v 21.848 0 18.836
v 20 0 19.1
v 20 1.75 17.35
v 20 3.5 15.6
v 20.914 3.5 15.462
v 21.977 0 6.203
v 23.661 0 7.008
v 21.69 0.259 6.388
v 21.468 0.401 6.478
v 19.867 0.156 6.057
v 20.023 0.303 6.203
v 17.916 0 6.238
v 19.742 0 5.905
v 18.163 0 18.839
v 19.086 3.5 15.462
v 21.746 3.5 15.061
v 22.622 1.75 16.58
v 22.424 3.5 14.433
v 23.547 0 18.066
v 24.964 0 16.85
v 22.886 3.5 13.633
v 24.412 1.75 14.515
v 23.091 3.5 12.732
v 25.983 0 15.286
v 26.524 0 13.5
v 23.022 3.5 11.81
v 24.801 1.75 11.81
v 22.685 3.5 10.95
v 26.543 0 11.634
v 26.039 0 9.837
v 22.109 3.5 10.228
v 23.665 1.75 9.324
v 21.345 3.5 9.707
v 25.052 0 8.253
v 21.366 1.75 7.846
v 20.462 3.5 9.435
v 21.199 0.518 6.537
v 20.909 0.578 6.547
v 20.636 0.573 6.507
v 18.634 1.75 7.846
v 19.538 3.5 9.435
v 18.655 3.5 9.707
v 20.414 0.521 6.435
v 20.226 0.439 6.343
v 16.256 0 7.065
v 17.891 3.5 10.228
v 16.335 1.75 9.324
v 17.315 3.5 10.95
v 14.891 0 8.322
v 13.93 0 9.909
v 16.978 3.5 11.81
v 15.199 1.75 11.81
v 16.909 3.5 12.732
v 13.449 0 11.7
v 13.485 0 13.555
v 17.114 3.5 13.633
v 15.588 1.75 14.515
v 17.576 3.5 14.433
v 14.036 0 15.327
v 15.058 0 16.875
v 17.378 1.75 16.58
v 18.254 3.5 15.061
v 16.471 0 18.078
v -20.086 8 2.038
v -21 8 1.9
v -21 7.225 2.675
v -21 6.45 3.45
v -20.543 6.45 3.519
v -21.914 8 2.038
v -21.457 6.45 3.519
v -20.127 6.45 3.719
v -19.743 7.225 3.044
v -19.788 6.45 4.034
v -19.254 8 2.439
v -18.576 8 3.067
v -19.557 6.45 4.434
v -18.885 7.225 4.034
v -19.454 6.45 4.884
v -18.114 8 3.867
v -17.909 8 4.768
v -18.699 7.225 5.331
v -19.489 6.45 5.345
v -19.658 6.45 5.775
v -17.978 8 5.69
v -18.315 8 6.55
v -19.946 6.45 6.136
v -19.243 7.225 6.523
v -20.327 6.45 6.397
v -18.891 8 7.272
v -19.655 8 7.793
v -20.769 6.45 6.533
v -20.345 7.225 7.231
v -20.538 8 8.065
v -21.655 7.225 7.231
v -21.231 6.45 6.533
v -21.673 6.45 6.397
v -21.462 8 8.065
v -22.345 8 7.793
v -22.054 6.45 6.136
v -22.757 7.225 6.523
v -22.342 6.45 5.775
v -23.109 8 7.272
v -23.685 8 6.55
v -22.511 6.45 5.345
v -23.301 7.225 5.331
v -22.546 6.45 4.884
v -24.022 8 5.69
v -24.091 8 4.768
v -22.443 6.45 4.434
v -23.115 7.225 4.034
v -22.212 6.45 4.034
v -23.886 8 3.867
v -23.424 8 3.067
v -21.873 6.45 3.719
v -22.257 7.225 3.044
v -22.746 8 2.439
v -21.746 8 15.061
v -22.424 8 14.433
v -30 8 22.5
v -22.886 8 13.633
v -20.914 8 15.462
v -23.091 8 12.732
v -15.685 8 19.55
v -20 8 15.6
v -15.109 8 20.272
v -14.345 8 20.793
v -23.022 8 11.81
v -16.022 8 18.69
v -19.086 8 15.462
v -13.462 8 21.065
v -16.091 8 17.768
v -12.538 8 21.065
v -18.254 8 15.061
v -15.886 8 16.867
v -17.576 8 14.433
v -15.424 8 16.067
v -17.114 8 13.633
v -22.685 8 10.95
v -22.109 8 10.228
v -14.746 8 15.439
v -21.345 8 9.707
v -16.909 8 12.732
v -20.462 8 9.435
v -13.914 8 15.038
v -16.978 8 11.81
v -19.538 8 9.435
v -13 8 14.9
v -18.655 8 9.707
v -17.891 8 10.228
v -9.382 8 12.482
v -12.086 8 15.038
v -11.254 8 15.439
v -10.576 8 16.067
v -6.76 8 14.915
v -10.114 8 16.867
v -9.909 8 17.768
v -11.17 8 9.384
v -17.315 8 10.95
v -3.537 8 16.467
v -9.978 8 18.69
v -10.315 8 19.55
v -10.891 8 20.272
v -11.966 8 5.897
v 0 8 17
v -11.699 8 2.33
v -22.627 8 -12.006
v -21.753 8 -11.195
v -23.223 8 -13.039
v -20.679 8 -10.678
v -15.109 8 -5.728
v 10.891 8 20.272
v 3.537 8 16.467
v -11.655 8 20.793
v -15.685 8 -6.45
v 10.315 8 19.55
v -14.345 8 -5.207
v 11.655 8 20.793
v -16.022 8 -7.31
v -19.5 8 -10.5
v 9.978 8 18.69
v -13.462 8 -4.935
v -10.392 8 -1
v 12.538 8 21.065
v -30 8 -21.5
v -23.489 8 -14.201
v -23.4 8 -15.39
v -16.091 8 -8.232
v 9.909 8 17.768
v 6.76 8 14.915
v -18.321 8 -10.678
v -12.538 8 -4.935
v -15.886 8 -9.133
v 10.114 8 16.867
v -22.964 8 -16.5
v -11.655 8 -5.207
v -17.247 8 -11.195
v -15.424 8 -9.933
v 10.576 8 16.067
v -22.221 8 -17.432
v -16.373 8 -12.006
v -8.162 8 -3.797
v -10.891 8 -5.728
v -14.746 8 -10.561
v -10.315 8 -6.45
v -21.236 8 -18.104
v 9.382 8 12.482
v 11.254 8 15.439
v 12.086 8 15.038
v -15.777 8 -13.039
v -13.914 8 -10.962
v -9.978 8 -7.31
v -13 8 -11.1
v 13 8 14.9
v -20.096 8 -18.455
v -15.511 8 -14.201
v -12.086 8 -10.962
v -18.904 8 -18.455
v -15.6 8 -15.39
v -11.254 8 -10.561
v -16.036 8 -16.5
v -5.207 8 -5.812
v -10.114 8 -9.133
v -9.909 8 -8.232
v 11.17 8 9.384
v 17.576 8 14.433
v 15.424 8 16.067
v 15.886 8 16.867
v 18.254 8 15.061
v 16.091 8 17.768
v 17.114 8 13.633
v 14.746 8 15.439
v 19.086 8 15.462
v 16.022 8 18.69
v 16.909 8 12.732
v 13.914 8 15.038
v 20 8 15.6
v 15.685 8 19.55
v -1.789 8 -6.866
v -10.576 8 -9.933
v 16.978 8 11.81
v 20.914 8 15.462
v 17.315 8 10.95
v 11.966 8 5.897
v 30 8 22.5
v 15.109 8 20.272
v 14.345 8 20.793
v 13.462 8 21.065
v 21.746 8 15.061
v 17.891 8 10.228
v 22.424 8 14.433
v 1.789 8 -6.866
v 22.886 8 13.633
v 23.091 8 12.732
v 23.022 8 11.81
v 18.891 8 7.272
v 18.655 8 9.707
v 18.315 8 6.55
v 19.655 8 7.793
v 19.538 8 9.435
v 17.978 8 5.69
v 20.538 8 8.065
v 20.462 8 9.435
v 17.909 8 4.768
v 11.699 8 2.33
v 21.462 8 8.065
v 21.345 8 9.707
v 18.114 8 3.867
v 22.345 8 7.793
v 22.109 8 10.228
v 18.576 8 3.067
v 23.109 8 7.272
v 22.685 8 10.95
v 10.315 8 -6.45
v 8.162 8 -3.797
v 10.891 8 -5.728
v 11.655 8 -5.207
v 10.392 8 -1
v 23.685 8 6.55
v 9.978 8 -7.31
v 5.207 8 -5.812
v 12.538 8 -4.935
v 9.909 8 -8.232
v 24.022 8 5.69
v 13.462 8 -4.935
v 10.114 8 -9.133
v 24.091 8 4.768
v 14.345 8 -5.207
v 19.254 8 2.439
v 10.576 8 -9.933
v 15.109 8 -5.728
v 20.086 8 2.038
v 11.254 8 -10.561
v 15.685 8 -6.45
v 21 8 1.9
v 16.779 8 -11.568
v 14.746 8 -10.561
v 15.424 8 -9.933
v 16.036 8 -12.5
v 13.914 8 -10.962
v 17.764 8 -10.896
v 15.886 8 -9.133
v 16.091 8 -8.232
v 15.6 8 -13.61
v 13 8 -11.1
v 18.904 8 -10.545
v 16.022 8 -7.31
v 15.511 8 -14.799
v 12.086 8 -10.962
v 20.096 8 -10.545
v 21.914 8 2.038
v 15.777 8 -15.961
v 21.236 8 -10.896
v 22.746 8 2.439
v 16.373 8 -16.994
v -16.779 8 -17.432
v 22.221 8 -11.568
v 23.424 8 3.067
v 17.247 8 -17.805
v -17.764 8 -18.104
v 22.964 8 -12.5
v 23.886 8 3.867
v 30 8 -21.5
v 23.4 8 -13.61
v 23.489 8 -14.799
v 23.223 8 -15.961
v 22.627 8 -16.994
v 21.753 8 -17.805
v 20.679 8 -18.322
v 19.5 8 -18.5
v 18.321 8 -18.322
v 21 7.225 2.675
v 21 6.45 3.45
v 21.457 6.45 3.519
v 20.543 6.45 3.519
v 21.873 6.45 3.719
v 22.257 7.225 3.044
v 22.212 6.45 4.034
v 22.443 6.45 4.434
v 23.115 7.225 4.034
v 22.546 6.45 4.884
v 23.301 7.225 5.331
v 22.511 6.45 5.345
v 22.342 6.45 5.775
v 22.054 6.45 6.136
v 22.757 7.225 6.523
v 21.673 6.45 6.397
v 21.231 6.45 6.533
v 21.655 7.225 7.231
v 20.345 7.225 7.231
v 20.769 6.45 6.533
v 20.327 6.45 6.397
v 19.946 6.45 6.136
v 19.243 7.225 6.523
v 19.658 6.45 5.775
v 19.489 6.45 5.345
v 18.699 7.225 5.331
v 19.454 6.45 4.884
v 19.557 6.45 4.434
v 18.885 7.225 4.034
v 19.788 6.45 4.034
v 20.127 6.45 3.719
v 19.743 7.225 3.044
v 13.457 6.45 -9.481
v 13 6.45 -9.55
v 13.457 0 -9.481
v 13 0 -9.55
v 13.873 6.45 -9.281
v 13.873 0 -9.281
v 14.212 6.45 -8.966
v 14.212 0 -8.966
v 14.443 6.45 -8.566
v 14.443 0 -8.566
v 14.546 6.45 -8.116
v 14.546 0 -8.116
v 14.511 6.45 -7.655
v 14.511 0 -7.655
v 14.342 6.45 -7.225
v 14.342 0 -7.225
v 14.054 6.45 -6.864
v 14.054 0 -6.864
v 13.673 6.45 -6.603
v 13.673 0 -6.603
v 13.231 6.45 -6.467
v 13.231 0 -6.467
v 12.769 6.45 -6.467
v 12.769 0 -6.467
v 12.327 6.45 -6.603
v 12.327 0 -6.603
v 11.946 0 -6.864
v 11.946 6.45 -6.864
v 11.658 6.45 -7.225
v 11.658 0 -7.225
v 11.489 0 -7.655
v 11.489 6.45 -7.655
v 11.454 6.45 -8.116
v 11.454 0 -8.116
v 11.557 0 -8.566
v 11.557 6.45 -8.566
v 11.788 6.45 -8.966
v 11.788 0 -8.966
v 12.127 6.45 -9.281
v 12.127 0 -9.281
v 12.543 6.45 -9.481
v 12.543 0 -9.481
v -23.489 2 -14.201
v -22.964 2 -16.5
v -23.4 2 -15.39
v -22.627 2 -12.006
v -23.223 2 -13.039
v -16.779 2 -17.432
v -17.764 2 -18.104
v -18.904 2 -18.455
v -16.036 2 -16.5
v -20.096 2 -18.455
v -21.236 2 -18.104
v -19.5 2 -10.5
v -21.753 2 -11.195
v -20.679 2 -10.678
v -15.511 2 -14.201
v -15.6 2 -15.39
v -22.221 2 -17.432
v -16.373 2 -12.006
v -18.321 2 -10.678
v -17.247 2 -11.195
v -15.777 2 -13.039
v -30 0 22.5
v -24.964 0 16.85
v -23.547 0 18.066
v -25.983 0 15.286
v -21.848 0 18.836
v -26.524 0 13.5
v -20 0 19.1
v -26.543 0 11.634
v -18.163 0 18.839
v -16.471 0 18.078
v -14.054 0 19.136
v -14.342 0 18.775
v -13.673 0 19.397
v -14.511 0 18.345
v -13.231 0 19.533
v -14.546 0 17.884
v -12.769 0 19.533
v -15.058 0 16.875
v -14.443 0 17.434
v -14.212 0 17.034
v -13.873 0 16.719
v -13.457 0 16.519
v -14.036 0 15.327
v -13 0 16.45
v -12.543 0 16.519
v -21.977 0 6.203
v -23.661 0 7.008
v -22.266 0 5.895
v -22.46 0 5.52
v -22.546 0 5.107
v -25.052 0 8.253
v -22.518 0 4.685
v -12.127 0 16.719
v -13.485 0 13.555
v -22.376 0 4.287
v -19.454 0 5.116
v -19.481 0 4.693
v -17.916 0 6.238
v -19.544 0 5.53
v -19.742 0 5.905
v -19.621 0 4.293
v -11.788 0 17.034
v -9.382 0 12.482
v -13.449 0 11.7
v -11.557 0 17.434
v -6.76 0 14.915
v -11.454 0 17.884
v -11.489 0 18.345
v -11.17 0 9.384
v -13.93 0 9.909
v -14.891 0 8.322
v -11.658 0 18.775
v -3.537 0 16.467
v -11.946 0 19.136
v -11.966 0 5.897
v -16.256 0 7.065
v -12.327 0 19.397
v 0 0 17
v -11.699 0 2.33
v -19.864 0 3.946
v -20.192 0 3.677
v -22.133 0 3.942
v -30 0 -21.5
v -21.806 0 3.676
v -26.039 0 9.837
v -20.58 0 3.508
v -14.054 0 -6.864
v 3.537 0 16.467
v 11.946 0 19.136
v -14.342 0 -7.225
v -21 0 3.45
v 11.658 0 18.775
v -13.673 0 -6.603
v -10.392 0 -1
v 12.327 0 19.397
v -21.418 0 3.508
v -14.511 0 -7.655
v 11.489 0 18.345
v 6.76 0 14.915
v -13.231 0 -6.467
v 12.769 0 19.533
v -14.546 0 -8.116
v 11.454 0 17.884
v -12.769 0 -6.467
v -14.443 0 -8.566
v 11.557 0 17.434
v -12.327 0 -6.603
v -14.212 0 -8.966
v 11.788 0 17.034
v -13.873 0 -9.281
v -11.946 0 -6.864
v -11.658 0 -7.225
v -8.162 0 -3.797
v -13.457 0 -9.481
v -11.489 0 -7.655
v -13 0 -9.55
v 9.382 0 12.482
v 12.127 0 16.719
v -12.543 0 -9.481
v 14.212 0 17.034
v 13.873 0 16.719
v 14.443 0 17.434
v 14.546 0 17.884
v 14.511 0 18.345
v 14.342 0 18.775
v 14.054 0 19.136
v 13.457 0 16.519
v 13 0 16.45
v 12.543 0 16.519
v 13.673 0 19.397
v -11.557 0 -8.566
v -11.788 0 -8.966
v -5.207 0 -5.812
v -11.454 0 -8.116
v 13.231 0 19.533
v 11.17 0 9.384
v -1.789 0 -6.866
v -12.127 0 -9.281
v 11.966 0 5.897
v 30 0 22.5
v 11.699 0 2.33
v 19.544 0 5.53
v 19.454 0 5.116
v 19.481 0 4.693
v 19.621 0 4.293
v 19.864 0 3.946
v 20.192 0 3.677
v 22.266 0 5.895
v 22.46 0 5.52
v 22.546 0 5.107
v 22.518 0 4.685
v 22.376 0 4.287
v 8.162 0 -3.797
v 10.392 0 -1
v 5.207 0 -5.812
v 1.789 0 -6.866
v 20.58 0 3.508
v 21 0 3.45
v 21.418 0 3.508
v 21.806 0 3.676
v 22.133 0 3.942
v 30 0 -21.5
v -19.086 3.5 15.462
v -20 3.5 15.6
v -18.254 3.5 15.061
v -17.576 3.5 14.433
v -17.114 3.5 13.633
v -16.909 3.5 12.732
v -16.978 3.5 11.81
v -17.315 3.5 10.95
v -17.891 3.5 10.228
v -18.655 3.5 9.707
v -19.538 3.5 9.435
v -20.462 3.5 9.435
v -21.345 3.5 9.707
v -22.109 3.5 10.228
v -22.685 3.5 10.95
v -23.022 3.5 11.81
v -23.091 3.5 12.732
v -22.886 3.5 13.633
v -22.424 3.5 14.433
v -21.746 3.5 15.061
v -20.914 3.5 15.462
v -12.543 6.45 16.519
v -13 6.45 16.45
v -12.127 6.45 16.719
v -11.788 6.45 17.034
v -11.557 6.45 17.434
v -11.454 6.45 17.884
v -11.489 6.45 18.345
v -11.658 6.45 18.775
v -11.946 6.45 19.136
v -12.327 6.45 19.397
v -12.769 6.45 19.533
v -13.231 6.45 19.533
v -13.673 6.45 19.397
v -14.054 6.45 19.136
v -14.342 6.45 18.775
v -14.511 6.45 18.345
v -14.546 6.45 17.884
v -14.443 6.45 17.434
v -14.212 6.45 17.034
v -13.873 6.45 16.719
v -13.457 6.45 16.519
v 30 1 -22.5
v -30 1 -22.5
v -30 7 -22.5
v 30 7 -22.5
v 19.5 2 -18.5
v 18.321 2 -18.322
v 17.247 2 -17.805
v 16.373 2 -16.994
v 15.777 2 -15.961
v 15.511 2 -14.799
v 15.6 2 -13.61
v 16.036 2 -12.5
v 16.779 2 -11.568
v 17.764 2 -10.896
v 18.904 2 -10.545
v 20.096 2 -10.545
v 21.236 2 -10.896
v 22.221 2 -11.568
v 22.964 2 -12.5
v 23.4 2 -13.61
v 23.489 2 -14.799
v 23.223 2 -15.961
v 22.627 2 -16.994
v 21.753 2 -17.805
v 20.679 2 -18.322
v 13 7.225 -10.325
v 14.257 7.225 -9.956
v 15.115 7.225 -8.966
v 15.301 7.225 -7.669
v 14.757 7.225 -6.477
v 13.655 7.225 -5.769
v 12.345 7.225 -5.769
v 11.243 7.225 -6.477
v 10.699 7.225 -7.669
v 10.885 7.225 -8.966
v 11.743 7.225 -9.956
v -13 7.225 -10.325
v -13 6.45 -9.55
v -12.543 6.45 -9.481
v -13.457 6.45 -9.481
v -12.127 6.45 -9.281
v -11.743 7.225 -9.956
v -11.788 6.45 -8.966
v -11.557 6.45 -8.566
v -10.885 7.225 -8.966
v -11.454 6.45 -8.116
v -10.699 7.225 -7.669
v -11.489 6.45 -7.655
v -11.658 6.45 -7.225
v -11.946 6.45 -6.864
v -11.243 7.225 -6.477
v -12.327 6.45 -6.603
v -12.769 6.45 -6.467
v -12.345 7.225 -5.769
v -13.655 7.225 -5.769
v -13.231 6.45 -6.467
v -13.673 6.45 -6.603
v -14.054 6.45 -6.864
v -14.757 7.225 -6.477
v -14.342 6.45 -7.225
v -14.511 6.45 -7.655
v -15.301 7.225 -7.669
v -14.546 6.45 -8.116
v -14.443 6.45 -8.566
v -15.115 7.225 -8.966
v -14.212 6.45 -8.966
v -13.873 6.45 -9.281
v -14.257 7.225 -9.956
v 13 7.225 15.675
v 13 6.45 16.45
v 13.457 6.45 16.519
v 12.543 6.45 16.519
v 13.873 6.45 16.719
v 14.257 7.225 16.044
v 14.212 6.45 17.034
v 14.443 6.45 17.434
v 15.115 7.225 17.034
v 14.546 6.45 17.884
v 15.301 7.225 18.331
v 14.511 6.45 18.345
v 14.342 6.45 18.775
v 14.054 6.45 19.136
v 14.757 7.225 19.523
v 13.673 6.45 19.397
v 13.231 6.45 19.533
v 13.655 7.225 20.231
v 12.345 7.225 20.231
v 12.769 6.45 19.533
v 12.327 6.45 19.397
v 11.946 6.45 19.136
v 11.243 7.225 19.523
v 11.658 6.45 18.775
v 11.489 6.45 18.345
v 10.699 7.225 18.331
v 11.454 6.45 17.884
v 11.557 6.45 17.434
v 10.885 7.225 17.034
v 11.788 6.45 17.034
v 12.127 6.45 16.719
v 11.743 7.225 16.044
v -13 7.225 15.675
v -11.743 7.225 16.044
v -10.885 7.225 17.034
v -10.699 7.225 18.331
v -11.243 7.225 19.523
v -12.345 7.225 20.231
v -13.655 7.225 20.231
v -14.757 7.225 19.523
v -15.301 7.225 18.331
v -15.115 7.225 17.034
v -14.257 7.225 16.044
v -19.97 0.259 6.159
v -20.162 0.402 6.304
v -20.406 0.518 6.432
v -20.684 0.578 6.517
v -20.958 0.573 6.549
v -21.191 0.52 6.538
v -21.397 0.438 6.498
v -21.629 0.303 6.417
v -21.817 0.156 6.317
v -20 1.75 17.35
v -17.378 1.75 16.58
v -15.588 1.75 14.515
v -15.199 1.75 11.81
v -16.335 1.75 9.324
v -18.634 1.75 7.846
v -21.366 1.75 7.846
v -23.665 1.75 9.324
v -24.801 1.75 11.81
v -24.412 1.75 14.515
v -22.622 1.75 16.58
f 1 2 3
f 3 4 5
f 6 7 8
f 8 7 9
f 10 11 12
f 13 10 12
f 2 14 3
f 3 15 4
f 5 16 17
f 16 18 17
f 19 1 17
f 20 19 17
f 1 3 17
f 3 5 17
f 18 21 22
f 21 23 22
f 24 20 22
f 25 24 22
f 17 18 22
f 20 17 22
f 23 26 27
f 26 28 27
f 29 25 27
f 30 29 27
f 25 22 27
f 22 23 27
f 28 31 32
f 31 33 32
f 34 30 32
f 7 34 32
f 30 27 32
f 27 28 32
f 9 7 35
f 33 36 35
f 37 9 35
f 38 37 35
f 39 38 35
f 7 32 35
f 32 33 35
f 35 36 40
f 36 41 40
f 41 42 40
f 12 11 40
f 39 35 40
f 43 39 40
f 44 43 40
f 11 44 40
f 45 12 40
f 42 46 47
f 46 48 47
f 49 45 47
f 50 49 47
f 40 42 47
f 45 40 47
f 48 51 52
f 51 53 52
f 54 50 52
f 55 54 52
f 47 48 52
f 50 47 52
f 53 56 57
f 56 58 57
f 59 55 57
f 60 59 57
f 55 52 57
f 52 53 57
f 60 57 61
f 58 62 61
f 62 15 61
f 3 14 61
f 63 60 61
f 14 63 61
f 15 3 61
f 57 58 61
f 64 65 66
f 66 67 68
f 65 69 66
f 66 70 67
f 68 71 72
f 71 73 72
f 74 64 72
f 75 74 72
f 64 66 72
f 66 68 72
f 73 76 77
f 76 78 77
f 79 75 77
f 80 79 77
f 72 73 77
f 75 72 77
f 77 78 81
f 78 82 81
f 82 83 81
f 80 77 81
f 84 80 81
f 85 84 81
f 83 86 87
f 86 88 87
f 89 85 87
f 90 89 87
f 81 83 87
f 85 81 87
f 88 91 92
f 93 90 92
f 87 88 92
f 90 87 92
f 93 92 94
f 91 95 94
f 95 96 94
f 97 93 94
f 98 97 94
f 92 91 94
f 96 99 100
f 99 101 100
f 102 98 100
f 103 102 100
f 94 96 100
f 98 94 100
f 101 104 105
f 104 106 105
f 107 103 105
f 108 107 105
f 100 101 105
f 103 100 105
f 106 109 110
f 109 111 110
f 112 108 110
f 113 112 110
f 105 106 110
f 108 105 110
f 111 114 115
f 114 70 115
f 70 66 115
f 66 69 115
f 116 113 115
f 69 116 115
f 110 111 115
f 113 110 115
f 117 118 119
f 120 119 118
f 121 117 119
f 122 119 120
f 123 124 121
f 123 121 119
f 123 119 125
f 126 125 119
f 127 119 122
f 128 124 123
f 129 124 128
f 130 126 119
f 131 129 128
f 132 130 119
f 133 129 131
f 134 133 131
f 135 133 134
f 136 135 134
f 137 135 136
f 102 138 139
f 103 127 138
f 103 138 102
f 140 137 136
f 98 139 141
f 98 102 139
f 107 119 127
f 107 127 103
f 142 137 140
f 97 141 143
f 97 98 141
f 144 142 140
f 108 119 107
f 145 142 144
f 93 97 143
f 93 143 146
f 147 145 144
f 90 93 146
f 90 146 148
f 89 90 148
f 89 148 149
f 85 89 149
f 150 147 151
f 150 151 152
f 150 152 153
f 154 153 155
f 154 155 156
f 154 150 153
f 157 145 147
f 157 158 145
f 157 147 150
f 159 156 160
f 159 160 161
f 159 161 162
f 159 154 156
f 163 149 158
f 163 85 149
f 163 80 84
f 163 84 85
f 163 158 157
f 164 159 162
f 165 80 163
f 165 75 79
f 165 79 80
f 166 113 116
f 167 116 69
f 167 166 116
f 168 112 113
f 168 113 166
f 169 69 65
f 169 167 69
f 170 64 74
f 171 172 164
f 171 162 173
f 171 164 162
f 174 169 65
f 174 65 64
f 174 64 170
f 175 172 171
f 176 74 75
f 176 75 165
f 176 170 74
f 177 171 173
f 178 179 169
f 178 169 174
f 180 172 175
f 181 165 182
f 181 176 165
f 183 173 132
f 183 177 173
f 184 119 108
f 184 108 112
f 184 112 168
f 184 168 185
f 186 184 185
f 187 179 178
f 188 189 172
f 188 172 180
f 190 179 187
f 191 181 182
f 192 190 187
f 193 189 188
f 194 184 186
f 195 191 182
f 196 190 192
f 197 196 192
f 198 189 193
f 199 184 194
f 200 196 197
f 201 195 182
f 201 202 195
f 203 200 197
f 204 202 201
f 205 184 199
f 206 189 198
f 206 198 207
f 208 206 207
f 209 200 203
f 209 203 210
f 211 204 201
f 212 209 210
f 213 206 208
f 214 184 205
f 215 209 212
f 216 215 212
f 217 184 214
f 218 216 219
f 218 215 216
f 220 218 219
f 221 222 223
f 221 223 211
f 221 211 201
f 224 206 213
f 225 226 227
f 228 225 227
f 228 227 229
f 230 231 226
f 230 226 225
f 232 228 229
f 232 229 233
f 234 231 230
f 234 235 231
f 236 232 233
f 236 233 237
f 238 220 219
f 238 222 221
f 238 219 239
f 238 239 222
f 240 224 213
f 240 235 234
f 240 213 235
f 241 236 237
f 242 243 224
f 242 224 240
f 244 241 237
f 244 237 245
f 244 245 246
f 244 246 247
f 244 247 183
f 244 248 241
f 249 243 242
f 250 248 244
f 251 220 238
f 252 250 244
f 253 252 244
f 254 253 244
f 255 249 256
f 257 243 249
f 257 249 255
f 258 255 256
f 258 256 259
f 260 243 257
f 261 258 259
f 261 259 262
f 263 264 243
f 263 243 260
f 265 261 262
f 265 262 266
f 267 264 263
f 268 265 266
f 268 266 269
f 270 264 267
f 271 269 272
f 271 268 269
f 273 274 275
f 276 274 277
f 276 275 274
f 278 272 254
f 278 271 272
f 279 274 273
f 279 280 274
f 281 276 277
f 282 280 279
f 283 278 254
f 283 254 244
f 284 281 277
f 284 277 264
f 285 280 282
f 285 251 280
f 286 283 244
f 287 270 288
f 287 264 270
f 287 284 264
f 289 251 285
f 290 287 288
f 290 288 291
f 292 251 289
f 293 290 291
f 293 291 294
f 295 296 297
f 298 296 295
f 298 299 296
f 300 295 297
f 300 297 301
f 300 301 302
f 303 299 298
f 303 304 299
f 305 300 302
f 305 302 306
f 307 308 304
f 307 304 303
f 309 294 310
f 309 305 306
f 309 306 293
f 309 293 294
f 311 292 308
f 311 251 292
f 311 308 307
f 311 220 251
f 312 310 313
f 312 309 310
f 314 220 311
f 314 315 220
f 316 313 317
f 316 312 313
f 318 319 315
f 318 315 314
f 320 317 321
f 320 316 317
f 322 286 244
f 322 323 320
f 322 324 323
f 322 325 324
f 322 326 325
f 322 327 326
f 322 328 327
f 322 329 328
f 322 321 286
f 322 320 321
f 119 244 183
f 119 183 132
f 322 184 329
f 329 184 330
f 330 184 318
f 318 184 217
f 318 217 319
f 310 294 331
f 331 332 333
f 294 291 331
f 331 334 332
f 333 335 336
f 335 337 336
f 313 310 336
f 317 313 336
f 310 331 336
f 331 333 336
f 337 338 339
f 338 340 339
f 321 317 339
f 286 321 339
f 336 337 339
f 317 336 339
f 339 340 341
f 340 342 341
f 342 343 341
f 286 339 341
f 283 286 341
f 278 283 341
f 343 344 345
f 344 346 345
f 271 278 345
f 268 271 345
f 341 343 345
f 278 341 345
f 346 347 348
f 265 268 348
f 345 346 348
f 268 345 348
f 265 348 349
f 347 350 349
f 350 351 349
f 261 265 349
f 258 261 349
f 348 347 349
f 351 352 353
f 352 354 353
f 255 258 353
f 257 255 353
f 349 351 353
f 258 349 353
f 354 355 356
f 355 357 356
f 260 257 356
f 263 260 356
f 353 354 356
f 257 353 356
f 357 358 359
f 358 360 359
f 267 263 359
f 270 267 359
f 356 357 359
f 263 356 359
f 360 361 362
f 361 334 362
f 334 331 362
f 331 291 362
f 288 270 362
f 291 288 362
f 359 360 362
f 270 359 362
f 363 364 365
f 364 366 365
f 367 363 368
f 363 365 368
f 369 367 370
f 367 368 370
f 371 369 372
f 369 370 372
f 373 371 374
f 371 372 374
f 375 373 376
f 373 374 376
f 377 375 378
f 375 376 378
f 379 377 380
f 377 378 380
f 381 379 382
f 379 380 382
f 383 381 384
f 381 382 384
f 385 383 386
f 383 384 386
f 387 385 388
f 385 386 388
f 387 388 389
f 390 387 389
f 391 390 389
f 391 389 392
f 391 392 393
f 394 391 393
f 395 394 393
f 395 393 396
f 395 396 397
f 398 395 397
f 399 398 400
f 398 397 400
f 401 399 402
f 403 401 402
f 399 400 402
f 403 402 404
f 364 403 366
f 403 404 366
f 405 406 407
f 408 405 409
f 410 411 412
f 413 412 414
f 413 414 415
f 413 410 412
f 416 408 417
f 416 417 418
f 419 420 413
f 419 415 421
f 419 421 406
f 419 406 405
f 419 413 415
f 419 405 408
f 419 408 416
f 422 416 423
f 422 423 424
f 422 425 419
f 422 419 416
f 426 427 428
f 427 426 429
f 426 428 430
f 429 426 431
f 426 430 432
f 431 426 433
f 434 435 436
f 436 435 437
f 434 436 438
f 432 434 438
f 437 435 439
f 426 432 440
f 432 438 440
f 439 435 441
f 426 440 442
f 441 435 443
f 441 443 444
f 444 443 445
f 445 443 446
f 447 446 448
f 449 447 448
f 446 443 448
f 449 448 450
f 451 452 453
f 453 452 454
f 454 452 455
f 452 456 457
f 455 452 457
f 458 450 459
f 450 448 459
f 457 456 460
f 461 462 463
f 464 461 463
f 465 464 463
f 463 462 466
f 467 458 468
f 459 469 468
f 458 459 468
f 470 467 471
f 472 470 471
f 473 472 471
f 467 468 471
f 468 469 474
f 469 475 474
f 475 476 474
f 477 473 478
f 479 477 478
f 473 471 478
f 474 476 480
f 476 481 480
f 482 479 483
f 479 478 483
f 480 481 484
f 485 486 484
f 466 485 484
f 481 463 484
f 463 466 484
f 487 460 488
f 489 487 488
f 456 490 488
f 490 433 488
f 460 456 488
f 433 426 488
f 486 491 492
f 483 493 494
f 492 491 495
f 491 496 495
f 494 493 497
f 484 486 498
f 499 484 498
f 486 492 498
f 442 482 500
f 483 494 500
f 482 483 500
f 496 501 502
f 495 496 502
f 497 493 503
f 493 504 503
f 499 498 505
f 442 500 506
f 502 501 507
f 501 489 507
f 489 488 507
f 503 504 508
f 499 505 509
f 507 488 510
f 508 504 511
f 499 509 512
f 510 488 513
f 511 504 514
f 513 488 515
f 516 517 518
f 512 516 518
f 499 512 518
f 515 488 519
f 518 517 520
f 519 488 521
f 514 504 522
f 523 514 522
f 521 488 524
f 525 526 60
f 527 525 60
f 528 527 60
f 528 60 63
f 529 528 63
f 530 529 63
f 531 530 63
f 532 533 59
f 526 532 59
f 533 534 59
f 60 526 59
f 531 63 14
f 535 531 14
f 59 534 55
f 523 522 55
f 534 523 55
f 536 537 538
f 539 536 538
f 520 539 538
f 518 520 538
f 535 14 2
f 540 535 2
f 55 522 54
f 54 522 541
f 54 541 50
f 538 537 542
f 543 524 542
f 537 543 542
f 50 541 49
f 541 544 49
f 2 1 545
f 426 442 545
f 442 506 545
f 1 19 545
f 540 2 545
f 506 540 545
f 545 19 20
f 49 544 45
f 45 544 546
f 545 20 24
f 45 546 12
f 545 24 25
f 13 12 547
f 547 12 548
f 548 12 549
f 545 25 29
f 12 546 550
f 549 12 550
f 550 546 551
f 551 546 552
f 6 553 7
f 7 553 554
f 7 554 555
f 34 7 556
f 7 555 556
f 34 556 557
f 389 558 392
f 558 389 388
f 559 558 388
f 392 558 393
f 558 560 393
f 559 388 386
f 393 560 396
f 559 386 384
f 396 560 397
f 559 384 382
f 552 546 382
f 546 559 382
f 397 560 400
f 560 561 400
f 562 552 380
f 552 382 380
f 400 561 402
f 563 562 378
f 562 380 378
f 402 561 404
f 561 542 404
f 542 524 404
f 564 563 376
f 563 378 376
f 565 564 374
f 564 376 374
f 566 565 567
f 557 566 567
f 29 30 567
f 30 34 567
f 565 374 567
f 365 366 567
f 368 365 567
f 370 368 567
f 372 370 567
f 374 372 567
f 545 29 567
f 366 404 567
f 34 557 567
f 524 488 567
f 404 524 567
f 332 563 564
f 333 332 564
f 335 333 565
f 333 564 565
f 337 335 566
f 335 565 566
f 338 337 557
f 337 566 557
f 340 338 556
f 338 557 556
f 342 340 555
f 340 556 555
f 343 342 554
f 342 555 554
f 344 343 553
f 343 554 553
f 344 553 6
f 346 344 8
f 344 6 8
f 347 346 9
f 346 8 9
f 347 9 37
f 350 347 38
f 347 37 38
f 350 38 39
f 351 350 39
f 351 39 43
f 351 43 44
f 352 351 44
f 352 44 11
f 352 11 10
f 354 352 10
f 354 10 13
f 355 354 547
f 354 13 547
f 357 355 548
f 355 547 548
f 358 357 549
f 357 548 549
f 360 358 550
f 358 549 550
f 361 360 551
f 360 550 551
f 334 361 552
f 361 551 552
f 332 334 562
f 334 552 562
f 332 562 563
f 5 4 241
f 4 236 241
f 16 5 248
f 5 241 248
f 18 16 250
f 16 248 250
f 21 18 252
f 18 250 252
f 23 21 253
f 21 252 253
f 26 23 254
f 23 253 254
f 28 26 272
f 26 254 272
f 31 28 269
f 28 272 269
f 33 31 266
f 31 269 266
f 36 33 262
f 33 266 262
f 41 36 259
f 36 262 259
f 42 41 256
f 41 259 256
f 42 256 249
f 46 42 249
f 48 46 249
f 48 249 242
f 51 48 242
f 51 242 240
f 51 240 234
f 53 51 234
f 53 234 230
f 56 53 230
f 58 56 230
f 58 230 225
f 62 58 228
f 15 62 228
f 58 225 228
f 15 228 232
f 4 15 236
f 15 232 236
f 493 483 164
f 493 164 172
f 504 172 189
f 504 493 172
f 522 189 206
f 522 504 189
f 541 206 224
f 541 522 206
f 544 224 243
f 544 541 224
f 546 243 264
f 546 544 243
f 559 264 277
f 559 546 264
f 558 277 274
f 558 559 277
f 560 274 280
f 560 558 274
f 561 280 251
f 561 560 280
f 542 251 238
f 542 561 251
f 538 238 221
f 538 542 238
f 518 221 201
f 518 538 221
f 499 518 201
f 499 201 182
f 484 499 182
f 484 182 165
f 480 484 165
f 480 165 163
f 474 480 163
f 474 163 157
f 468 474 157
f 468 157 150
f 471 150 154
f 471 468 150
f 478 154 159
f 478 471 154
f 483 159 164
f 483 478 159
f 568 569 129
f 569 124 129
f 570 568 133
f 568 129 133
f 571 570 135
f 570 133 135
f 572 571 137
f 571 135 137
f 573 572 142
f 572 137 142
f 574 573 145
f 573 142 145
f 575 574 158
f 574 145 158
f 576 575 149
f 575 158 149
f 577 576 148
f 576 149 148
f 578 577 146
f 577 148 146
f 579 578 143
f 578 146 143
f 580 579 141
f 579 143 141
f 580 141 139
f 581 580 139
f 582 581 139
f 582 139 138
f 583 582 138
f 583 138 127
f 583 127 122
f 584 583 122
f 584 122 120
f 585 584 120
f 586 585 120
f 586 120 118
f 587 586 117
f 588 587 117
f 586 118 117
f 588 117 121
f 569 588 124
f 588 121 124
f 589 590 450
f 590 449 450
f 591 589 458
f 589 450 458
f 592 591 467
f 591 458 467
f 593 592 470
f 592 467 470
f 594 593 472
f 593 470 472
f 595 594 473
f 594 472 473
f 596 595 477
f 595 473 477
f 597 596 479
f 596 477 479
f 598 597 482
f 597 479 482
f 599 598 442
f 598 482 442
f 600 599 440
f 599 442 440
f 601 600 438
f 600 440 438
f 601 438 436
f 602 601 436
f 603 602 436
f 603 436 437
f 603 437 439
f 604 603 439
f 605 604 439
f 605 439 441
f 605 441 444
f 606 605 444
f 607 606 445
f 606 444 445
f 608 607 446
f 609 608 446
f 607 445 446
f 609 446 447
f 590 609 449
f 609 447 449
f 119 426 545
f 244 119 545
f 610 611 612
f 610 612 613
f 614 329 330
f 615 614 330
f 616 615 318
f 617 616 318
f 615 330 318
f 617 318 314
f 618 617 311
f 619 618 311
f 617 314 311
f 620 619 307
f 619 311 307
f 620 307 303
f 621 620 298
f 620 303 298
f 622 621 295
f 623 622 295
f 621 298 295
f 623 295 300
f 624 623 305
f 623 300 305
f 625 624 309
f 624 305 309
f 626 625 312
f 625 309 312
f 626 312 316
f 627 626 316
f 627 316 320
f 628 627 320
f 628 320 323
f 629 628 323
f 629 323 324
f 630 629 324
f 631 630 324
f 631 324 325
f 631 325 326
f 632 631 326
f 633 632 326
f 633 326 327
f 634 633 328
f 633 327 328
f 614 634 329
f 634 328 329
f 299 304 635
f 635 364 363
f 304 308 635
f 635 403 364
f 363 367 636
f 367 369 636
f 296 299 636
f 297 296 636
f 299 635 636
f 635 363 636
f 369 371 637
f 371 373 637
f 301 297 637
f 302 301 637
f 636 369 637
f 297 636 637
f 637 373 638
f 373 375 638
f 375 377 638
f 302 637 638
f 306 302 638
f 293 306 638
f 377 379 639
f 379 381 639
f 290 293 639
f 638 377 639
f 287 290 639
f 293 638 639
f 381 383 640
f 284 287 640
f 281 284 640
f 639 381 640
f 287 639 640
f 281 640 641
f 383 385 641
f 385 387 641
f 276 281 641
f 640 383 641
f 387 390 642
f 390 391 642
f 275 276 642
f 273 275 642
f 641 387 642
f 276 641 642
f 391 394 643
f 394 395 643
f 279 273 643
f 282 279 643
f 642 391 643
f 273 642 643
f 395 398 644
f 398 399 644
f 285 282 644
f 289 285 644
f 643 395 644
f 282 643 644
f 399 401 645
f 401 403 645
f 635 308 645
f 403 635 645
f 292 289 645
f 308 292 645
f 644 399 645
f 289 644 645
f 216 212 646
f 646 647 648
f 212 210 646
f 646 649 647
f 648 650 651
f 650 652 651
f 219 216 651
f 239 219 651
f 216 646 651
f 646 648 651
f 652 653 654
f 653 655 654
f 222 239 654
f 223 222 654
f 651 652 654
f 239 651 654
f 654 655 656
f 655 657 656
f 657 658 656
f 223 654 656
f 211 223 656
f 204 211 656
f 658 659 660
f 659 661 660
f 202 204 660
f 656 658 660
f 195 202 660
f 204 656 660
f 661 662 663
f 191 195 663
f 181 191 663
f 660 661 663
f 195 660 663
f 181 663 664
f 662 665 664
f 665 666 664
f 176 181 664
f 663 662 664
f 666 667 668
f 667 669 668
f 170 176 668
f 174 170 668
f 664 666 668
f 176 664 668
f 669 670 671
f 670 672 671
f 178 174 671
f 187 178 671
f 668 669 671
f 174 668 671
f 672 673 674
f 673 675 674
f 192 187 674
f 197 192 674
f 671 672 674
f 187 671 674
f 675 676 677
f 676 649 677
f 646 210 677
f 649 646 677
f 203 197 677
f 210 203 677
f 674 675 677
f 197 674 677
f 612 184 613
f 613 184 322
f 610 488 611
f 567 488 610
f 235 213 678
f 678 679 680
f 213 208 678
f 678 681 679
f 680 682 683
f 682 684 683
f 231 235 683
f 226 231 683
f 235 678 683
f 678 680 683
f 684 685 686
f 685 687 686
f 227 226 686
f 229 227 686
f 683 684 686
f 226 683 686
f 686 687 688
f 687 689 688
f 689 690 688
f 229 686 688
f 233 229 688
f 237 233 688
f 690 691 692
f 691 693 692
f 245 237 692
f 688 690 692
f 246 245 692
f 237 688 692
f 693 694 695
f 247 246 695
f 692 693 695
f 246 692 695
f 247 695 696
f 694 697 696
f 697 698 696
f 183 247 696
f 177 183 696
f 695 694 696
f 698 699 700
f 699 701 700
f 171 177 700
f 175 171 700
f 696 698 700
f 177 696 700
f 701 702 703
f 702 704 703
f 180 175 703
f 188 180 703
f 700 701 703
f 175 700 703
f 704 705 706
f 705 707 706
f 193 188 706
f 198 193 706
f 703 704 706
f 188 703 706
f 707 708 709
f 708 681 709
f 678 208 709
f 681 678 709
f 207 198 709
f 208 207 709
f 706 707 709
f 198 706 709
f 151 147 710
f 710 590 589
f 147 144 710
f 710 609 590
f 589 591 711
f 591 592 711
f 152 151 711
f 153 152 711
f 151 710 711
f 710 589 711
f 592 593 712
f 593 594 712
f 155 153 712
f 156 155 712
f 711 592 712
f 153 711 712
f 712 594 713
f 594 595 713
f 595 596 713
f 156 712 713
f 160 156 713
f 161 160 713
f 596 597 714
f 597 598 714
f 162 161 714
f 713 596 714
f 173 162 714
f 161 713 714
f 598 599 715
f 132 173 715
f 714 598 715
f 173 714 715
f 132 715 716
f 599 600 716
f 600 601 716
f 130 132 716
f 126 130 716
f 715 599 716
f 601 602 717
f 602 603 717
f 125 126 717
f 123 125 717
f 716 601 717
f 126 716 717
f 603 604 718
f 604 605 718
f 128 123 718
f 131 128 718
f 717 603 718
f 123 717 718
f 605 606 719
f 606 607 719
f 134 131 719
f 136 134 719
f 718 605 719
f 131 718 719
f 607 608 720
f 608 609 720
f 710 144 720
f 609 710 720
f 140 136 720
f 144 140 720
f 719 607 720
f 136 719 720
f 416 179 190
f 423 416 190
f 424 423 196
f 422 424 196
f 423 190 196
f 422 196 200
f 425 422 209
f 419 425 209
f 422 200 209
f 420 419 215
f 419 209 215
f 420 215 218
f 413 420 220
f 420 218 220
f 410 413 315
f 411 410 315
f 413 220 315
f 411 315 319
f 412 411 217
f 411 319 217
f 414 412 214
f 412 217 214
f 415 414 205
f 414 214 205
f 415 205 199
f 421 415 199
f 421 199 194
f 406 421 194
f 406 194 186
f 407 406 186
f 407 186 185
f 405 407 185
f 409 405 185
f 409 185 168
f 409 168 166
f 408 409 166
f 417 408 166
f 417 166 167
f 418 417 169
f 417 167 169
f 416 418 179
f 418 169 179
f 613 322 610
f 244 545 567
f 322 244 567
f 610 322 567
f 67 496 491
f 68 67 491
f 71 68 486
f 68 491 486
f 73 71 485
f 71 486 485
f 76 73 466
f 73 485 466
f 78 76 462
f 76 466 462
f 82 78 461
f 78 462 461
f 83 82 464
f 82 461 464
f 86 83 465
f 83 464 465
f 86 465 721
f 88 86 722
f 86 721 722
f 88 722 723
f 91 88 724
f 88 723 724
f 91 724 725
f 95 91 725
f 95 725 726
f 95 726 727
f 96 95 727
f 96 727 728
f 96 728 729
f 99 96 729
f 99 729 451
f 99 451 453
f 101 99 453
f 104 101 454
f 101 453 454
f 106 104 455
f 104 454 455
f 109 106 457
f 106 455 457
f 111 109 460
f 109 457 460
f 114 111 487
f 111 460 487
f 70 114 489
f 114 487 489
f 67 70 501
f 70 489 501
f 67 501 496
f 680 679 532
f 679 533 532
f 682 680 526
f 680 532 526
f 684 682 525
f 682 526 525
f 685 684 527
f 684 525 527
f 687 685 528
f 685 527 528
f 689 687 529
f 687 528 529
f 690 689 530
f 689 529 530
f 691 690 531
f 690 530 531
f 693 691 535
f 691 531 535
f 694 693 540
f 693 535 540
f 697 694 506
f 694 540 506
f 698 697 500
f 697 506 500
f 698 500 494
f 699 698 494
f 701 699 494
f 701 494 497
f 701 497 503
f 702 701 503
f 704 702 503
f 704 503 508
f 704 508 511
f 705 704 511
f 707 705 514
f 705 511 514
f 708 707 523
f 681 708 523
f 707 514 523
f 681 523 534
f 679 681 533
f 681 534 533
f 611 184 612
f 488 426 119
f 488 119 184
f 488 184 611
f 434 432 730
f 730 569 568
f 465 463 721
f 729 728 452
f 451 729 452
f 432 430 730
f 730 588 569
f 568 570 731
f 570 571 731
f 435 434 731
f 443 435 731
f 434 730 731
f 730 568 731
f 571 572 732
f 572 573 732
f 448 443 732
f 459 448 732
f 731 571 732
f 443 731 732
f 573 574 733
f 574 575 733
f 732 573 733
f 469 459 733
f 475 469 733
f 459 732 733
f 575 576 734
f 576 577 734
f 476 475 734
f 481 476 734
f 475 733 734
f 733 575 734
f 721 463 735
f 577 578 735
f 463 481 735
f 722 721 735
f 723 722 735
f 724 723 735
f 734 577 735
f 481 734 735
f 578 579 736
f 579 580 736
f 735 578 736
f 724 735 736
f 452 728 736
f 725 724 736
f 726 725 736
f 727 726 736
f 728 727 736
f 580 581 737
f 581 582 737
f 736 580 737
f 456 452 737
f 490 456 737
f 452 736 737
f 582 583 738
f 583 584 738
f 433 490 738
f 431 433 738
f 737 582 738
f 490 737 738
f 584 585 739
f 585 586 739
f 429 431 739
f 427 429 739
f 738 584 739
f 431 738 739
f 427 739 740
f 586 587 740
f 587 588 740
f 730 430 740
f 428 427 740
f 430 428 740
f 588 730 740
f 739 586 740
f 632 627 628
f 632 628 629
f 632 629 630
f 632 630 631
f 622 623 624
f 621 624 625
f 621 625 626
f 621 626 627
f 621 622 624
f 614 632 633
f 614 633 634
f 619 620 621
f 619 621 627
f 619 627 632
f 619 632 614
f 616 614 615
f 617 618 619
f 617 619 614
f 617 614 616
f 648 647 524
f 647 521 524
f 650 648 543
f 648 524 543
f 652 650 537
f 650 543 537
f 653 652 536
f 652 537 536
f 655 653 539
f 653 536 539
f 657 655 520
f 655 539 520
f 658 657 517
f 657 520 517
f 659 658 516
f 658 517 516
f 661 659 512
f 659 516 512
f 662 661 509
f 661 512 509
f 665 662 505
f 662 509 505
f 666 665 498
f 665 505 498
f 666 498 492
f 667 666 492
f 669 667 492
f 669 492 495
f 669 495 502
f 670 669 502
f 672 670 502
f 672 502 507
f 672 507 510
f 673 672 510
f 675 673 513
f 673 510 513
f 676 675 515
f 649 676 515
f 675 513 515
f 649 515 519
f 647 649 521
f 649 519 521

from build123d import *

# Parameters (mm, degrees)
SKETCH_1_W                  = 60
SKETCH_1_H                  = 45
SKETCH_1_R                  = 2.5
SKETCH_1_R_2                = 12
EXTRUDE_1_DEPTH             = 8
CHAMFER_1_SIZE              = 1
SKETCH_2_R                  = 4
CUT_EXTRUDE_1_DEPTH         = 6
SKETCH_3_R                  = 1.25
SKETCH_3_R_2                = 1.55
CUT_EXTRUDE_2_DEPTH         = 39.34383914
HOLE_WIZARD_2_D             = 6.2
HOLE_WIZARD_2_CSINK_D       = 13.2
HOLE_WIZARD_2_CSINK_ANGLE   = 90
HOLE_WIZARD_2_2_D           = 3.1
HOLE_WIZARD_2_2_CSINK_D     = 6.2
HOLE_WIZARD_2_2_CSINK_ANGLE = 90


with BuildPart() as part:
    # 草图1 → 凸台-拉伸1 (new body)
    with BuildSketch(Plane(origin=(0, 0, 0), x_dir=(1, 0, 0), z_dir=(0, 1, 0))):
        Rectangle(SKETCH_1_W, SKETCH_1_H)
        with Locations(Location((-20, -12.5, 0), (0, 0, 270))):
            Circle(SKETCH_1_R, mode=Mode.SUBTRACT)
        with Locations(Location((20, -12.5, 0), (0, 0, 90))):
            Circle(SKETCH_1_R, mode=Mode.SUBTRACT)
        with Locations(Location((0, -5, 0), (0, 0, 270))):
            Circle(SKETCH_1_R_2, mode=Mode.SUBTRACT)
    extrude(amount=EXTRUDE_1_DEPTH)

    # 倒角1
    chamfer_1_edges = [part.edges().sort_by_distance(p)[0] for p in [
        (0, 8, -22.5),
        (0, 0, -22.5),
    ]]
    chamfer(chamfer_1_edges, length=CHAMFER_1_SIZE)

    # 草图2 → 切除-拉伸1 (cut)
    with BuildSketch(Plane(origin=(0, 8, 0), x_dir=(1, 0, 0), z_dir=(0, 1, 0))):
        with Locations(Location((-19.5, 14.5, 0), (0, 0, 270))):
            Circle(SKETCH_2_R)
        with Locations(Location((19.5, 14.5, 0), (0, 0, 90))):
            Circle(SKETCH_2_R)
    extrude(amount=-CUT_EXTRUDE_1_DEPTH, mode=Mode.SUBTRACT)

    # 草图3 → 切除-拉伸2 (cut, through all)
    with BuildSketch(Plane(origin=(0, 0, 0), x_dir=(-1, 0, 0), z_dir=(0, -1, 0))):
        with Locations(Location((13, -18, 0), (0, 0, 90))):
            Circle(SKETCH_3_R)
        with Locations(Location((-13, -18, 0), (0, 0, 270))):
            Circle(SKETCH_3_R)
        with Locations(Location((13, 8, 0), (0, 0, 90))):
            Circle(SKETCH_3_R)
        with Locations(Location((-13, 8, 0), (0, 0, 270))):
            Circle(SKETCH_3_R)
        with Locations(Location((21, -5, 0), (0, 0, 90))):
            Circle(SKETCH_3_R_2)
        with Locations(Location((-21, -5, 0), (0, 0, 90))):
            Circle(SKETCH_3_R_2)
    extrude(amount=-CUT_EXTRUDE_2_DEPTH, mode=Mode.SUBTRACT)

    # Hole Wizard 2 (through all)
    with Locations(Plane(origin=(20, 0, 12.5), x_dir=(0, 0, -1), z_dir=(0, -1, 0))):
        with Locations((0, 0), (0, -40)):
            CounterSinkHole(HOLE_WIZARD_2_D / 2, HOLE_WIZARD_2_CSINK_D / 2, counter_sink_angle=HOLE_WIZARD_2_CSINK_ANGLE)

    # Hole Wizard 2 2 (through all)
    with Locations(Plane(origin=(-13, 8, -8), x_dir=(0, 0, 1), z_dir=(0, 1, 0))):
        with Locations((0, 0), (26, 0), (26, 26), (0, 26), (13, -8), (13, 34)):
            CounterSinkHole(HOLE_WIZARD_2_2_D / 2, HOLE_WIZARD_2_2_CSINK_D / 2, counter_sink_angle=HOLE_WIZARD_2_2_CSINK_ANGLE)


solid = part.part
